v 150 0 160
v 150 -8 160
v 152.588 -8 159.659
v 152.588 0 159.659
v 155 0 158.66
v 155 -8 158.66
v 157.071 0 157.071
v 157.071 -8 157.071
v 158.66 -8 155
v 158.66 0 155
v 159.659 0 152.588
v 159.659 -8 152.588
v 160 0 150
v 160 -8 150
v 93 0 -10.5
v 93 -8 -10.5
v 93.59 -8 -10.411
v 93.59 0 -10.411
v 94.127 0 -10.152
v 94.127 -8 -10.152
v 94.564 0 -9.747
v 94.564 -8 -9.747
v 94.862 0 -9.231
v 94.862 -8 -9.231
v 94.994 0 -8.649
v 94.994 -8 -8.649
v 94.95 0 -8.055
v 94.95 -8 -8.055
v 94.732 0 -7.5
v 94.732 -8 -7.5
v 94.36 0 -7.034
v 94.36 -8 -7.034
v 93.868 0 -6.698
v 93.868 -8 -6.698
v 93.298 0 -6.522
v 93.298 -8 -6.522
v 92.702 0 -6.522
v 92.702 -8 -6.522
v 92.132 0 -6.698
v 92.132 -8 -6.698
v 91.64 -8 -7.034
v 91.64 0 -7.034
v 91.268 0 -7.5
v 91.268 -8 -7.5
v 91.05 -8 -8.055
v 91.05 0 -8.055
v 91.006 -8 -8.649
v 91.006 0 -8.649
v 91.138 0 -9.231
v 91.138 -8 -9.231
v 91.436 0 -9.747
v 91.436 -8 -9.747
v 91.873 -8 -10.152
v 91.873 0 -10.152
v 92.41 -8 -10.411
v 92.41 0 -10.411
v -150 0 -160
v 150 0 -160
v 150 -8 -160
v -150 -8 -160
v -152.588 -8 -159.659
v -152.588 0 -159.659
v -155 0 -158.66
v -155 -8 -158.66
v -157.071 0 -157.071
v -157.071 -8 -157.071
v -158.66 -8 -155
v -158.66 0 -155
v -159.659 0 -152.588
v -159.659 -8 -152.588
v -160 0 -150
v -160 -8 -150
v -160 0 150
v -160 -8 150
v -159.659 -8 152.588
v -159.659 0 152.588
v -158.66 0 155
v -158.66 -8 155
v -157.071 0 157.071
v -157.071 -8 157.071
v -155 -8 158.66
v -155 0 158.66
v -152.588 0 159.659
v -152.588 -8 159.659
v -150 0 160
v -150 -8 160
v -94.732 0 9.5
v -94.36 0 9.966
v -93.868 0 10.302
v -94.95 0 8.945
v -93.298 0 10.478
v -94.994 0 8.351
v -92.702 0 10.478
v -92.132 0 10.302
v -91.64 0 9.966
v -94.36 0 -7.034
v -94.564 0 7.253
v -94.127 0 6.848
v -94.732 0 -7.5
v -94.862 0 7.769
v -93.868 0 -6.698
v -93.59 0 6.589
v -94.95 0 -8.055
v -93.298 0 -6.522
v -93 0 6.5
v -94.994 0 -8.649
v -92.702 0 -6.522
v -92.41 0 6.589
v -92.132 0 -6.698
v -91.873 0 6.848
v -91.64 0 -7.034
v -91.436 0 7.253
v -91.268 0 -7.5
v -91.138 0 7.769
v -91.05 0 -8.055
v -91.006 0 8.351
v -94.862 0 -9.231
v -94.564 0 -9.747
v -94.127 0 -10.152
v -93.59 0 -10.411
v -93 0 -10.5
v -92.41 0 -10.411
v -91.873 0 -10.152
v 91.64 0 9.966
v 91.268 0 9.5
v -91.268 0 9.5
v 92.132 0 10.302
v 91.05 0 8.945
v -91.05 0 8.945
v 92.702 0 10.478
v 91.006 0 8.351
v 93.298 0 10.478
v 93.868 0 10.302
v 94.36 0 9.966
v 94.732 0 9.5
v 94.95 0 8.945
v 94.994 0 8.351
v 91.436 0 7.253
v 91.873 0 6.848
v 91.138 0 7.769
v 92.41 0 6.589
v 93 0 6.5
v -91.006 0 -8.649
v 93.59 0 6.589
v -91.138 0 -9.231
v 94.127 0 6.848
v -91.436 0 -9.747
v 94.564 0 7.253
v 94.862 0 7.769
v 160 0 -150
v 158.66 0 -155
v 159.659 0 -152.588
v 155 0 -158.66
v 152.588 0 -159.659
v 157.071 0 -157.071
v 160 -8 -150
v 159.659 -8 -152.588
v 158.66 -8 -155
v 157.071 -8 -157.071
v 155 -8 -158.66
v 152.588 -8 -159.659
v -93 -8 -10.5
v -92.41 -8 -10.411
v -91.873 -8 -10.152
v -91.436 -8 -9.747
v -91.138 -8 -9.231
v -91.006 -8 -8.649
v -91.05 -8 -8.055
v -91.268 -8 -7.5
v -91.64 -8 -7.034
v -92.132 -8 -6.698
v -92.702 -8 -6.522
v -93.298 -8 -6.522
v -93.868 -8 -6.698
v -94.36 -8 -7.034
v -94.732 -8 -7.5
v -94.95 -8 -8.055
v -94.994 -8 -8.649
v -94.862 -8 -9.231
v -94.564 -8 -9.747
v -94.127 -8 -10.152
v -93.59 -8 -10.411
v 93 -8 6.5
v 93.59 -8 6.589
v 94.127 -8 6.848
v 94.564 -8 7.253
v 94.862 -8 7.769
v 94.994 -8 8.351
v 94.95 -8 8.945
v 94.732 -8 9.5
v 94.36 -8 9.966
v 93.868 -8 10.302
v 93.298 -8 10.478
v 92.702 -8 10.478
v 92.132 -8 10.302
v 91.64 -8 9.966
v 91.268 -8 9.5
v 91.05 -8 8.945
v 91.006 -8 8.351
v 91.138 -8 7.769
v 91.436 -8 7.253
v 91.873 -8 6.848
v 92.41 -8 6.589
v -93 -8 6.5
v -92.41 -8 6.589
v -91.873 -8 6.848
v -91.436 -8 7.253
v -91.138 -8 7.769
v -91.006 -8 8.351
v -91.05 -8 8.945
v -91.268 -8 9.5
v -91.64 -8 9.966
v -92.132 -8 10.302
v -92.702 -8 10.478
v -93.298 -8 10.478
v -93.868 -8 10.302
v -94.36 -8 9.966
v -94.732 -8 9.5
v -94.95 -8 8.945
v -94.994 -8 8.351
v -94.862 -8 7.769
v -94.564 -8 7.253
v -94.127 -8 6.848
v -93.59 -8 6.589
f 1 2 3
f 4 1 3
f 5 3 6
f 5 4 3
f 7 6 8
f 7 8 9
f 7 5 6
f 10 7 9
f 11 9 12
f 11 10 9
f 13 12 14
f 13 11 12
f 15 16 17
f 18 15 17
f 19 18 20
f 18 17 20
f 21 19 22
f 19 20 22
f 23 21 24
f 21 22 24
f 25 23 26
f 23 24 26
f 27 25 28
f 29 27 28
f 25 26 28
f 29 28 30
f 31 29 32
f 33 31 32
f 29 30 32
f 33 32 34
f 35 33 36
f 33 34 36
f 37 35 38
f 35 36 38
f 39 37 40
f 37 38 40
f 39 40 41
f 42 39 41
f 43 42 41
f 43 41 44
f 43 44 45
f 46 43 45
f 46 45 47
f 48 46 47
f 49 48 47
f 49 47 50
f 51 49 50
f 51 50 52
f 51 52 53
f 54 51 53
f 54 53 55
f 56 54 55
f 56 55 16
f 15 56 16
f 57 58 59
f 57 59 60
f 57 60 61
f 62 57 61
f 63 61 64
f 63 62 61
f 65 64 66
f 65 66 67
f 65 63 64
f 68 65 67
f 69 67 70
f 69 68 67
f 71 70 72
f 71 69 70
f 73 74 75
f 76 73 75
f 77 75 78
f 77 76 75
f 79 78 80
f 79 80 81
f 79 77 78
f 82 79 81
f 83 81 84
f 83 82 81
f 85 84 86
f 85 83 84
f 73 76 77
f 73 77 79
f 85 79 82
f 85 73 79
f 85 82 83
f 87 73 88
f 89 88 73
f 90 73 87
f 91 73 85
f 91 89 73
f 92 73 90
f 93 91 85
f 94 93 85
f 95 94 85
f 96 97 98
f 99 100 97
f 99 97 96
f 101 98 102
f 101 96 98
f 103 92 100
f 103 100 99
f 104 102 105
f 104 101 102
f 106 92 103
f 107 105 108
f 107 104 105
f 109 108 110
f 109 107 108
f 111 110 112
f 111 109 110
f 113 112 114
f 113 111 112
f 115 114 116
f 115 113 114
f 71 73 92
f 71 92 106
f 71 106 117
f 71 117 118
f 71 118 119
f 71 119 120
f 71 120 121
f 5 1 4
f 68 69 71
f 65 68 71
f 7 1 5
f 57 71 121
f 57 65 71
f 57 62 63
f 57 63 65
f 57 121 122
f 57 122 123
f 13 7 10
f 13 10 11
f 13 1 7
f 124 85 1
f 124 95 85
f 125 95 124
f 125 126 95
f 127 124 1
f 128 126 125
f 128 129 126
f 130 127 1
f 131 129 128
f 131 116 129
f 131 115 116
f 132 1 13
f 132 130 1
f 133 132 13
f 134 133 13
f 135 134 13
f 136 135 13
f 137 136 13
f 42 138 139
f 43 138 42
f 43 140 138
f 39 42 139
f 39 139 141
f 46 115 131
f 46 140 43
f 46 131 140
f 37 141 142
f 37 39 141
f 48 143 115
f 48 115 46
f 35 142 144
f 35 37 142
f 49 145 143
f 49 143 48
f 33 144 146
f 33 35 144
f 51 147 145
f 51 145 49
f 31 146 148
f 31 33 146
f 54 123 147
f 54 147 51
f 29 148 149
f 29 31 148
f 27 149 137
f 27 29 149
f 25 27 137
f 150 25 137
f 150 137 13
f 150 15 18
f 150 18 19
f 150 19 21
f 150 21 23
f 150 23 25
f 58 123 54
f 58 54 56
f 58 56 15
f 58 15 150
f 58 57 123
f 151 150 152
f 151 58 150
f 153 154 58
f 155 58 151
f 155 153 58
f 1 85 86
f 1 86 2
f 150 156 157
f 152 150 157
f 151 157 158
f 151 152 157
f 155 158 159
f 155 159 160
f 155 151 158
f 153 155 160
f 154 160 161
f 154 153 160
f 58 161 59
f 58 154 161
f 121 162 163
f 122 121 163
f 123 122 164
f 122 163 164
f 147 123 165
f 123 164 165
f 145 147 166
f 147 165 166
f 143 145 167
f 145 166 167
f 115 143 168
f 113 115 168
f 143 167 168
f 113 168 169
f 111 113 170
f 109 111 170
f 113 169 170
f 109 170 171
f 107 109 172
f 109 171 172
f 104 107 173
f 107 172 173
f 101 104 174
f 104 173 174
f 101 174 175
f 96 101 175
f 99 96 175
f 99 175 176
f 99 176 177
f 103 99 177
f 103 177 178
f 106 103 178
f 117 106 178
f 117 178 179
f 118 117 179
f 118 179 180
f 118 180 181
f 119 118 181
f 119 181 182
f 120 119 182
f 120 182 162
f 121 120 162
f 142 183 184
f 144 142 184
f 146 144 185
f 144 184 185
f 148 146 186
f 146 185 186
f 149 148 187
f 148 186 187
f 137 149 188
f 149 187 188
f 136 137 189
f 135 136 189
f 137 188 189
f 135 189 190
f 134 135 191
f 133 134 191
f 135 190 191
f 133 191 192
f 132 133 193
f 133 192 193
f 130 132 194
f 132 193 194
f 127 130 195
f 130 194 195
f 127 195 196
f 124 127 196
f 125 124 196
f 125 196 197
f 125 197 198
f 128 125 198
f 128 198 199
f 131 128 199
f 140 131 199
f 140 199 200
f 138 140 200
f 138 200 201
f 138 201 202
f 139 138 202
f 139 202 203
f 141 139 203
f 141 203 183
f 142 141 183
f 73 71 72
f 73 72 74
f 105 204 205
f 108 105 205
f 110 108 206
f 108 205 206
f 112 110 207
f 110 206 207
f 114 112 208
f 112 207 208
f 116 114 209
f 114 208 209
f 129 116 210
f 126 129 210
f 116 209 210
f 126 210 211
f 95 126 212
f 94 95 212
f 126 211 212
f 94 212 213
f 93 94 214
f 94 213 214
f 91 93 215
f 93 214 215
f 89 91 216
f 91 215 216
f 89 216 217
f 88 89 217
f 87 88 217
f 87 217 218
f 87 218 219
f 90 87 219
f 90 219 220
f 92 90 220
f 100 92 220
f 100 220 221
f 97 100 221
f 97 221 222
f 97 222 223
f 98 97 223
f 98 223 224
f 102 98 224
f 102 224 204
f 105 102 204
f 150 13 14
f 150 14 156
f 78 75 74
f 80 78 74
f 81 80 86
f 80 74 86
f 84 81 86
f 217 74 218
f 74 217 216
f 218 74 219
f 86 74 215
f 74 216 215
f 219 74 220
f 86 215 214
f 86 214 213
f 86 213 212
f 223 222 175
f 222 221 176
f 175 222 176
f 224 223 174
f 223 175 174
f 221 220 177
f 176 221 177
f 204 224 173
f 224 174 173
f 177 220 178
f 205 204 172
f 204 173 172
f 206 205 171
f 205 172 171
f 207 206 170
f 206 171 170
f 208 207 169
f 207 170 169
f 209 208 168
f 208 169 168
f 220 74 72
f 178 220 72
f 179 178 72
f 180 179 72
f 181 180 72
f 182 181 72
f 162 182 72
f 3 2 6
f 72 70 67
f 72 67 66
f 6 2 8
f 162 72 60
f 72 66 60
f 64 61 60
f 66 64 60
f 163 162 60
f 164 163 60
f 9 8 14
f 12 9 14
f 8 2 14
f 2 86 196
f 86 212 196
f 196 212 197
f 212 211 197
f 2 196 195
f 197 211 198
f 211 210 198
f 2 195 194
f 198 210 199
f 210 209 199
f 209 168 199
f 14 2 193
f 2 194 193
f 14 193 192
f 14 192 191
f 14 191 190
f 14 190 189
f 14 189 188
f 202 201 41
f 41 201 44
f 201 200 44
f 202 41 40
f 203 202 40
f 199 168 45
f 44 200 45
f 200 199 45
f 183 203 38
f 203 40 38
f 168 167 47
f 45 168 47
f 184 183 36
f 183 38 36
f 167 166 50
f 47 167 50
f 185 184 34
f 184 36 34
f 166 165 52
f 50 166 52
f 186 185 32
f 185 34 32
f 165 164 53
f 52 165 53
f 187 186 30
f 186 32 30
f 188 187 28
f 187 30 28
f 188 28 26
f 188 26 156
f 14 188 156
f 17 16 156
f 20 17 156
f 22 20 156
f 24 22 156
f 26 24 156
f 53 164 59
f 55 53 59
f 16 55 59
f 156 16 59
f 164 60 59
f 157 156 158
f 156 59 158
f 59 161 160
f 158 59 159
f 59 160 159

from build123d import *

# Parameters (mm, degrees)
EXTRUDE_1_DEPTH     = 8
CUT_EXTRUDE_1_REACH = 228.416
SKETCH_2_R          = 2


with BuildPart() as part:
    # 草图1 → 凸台-拉伸1 (new body)
    with BuildSketch(Plane(origin=(0, 0, 0), x_dir=(1, 0, 0), z_dir=(0, 1, 0))):
        with BuildLine():
            Line((-150, -160), (150, -160))
            ThreePointArc((150, -160), (157.071067812, -157.071067812), (160, -150))
            Line((160, -150), (160, 150))
            ThreePointArc((160, 150), (157.071067812, 157.071067812), (150, 160))
            Line((150, 160), (-150, 160))
            ThreePointArc((-150, 160), (-157.071067812, 157.071067812), (-160, 150))
            Line((-160, 150), (-160, -150))
            ThreePointArc((-160, -150), (-157.071067812, -157.071067812), (-150, -160))
        make_face()
    extrude(amount=-EXTRUDE_1_DEPTH)

    # 草图2 → 切除-拉伸1 (cut, up to next)
    with BuildSketch(Plane.XZ.offset(8), mode=Mode.PRIVATE) as cut_extrude_1_sk1:
        with Locations(Location((-93, 8.5, 0), (0, 0, 270))):
            Circle(SKETCH_2_R)
    cut_extrude_1_tool1 = extrude(cut_extrude_1_sk1.sketch, amount=-CUT_EXTRUDE_1_REACH, mode=Mode.PRIVATE) & part.part
    # 草图2 → 切除-拉伸1 (cut, up to next)
    with BuildSketch(Plane.XZ.offset(8), mode=Mode.PRIVATE) as cut_extrude_1_sk2:
        with Locations(Location((93, 8.5, 0), (0, 0, 270))):
            Circle(SKETCH_2_R)
    cut_extrude_1_tool2 = extrude(cut_extrude_1_sk2.sketch, amount=-CUT_EXTRUDE_1_REACH, mode=Mode.PRIVATE) & part.part
    # 草图2 → 切除-拉伸1 (cut, up to next)
    with BuildSketch(Plane.XZ.offset(8), mode=Mode.PRIVATE) as cut_extrude_1_sk3:
        with Locations(Location((93, -8.5, 0), (0, 0, 270))):
            Circle(SKETCH_2_R)
    cut_extrude_1_tool3 = extrude(cut_extrude_1_sk3.sketch, amount=-CUT_EXTRUDE_1_REACH, mode=Mode.PRIVATE) & part.part
    # 草图2 → 切除-拉伸1 (cut, up to next)
    with BuildSketch(Plane.XZ.offset(8), mode=Mode.PRIVATE) as cut_extrude_1_sk4:
        with Locations(Location((-93, -8.5, 0), (0, 0, 270))):
            Circle(SKETCH_2_R)
    cut_extrude_1_tool4 = extrude(cut_extrude_1_sk4.sketch, amount=-CUT_EXTRUDE_1_REACH, mode=Mode.PRIVATE) & part.part
    add(cut_extrude_1_tool1.solids().sort_by_distance((-93, -8, 8.5))[0], mode=Mode.SUBTRACT)
    add(cut_extrude_1_tool2.solids().sort_by_distance((93, -8, 8.5))[0], mode=Mode.SUBTRACT)
    add(cut_extrude_1_tool3.solids().sort_by_distance((93, -8, -8.5))[0], mode=Mode.SUBTRACT)
    add(cut_extrude_1_tool4.solids().sort_by_distance((-93, -8, -8.5))[0], mode=Mode.SUBTRACT)


solid = part.part
